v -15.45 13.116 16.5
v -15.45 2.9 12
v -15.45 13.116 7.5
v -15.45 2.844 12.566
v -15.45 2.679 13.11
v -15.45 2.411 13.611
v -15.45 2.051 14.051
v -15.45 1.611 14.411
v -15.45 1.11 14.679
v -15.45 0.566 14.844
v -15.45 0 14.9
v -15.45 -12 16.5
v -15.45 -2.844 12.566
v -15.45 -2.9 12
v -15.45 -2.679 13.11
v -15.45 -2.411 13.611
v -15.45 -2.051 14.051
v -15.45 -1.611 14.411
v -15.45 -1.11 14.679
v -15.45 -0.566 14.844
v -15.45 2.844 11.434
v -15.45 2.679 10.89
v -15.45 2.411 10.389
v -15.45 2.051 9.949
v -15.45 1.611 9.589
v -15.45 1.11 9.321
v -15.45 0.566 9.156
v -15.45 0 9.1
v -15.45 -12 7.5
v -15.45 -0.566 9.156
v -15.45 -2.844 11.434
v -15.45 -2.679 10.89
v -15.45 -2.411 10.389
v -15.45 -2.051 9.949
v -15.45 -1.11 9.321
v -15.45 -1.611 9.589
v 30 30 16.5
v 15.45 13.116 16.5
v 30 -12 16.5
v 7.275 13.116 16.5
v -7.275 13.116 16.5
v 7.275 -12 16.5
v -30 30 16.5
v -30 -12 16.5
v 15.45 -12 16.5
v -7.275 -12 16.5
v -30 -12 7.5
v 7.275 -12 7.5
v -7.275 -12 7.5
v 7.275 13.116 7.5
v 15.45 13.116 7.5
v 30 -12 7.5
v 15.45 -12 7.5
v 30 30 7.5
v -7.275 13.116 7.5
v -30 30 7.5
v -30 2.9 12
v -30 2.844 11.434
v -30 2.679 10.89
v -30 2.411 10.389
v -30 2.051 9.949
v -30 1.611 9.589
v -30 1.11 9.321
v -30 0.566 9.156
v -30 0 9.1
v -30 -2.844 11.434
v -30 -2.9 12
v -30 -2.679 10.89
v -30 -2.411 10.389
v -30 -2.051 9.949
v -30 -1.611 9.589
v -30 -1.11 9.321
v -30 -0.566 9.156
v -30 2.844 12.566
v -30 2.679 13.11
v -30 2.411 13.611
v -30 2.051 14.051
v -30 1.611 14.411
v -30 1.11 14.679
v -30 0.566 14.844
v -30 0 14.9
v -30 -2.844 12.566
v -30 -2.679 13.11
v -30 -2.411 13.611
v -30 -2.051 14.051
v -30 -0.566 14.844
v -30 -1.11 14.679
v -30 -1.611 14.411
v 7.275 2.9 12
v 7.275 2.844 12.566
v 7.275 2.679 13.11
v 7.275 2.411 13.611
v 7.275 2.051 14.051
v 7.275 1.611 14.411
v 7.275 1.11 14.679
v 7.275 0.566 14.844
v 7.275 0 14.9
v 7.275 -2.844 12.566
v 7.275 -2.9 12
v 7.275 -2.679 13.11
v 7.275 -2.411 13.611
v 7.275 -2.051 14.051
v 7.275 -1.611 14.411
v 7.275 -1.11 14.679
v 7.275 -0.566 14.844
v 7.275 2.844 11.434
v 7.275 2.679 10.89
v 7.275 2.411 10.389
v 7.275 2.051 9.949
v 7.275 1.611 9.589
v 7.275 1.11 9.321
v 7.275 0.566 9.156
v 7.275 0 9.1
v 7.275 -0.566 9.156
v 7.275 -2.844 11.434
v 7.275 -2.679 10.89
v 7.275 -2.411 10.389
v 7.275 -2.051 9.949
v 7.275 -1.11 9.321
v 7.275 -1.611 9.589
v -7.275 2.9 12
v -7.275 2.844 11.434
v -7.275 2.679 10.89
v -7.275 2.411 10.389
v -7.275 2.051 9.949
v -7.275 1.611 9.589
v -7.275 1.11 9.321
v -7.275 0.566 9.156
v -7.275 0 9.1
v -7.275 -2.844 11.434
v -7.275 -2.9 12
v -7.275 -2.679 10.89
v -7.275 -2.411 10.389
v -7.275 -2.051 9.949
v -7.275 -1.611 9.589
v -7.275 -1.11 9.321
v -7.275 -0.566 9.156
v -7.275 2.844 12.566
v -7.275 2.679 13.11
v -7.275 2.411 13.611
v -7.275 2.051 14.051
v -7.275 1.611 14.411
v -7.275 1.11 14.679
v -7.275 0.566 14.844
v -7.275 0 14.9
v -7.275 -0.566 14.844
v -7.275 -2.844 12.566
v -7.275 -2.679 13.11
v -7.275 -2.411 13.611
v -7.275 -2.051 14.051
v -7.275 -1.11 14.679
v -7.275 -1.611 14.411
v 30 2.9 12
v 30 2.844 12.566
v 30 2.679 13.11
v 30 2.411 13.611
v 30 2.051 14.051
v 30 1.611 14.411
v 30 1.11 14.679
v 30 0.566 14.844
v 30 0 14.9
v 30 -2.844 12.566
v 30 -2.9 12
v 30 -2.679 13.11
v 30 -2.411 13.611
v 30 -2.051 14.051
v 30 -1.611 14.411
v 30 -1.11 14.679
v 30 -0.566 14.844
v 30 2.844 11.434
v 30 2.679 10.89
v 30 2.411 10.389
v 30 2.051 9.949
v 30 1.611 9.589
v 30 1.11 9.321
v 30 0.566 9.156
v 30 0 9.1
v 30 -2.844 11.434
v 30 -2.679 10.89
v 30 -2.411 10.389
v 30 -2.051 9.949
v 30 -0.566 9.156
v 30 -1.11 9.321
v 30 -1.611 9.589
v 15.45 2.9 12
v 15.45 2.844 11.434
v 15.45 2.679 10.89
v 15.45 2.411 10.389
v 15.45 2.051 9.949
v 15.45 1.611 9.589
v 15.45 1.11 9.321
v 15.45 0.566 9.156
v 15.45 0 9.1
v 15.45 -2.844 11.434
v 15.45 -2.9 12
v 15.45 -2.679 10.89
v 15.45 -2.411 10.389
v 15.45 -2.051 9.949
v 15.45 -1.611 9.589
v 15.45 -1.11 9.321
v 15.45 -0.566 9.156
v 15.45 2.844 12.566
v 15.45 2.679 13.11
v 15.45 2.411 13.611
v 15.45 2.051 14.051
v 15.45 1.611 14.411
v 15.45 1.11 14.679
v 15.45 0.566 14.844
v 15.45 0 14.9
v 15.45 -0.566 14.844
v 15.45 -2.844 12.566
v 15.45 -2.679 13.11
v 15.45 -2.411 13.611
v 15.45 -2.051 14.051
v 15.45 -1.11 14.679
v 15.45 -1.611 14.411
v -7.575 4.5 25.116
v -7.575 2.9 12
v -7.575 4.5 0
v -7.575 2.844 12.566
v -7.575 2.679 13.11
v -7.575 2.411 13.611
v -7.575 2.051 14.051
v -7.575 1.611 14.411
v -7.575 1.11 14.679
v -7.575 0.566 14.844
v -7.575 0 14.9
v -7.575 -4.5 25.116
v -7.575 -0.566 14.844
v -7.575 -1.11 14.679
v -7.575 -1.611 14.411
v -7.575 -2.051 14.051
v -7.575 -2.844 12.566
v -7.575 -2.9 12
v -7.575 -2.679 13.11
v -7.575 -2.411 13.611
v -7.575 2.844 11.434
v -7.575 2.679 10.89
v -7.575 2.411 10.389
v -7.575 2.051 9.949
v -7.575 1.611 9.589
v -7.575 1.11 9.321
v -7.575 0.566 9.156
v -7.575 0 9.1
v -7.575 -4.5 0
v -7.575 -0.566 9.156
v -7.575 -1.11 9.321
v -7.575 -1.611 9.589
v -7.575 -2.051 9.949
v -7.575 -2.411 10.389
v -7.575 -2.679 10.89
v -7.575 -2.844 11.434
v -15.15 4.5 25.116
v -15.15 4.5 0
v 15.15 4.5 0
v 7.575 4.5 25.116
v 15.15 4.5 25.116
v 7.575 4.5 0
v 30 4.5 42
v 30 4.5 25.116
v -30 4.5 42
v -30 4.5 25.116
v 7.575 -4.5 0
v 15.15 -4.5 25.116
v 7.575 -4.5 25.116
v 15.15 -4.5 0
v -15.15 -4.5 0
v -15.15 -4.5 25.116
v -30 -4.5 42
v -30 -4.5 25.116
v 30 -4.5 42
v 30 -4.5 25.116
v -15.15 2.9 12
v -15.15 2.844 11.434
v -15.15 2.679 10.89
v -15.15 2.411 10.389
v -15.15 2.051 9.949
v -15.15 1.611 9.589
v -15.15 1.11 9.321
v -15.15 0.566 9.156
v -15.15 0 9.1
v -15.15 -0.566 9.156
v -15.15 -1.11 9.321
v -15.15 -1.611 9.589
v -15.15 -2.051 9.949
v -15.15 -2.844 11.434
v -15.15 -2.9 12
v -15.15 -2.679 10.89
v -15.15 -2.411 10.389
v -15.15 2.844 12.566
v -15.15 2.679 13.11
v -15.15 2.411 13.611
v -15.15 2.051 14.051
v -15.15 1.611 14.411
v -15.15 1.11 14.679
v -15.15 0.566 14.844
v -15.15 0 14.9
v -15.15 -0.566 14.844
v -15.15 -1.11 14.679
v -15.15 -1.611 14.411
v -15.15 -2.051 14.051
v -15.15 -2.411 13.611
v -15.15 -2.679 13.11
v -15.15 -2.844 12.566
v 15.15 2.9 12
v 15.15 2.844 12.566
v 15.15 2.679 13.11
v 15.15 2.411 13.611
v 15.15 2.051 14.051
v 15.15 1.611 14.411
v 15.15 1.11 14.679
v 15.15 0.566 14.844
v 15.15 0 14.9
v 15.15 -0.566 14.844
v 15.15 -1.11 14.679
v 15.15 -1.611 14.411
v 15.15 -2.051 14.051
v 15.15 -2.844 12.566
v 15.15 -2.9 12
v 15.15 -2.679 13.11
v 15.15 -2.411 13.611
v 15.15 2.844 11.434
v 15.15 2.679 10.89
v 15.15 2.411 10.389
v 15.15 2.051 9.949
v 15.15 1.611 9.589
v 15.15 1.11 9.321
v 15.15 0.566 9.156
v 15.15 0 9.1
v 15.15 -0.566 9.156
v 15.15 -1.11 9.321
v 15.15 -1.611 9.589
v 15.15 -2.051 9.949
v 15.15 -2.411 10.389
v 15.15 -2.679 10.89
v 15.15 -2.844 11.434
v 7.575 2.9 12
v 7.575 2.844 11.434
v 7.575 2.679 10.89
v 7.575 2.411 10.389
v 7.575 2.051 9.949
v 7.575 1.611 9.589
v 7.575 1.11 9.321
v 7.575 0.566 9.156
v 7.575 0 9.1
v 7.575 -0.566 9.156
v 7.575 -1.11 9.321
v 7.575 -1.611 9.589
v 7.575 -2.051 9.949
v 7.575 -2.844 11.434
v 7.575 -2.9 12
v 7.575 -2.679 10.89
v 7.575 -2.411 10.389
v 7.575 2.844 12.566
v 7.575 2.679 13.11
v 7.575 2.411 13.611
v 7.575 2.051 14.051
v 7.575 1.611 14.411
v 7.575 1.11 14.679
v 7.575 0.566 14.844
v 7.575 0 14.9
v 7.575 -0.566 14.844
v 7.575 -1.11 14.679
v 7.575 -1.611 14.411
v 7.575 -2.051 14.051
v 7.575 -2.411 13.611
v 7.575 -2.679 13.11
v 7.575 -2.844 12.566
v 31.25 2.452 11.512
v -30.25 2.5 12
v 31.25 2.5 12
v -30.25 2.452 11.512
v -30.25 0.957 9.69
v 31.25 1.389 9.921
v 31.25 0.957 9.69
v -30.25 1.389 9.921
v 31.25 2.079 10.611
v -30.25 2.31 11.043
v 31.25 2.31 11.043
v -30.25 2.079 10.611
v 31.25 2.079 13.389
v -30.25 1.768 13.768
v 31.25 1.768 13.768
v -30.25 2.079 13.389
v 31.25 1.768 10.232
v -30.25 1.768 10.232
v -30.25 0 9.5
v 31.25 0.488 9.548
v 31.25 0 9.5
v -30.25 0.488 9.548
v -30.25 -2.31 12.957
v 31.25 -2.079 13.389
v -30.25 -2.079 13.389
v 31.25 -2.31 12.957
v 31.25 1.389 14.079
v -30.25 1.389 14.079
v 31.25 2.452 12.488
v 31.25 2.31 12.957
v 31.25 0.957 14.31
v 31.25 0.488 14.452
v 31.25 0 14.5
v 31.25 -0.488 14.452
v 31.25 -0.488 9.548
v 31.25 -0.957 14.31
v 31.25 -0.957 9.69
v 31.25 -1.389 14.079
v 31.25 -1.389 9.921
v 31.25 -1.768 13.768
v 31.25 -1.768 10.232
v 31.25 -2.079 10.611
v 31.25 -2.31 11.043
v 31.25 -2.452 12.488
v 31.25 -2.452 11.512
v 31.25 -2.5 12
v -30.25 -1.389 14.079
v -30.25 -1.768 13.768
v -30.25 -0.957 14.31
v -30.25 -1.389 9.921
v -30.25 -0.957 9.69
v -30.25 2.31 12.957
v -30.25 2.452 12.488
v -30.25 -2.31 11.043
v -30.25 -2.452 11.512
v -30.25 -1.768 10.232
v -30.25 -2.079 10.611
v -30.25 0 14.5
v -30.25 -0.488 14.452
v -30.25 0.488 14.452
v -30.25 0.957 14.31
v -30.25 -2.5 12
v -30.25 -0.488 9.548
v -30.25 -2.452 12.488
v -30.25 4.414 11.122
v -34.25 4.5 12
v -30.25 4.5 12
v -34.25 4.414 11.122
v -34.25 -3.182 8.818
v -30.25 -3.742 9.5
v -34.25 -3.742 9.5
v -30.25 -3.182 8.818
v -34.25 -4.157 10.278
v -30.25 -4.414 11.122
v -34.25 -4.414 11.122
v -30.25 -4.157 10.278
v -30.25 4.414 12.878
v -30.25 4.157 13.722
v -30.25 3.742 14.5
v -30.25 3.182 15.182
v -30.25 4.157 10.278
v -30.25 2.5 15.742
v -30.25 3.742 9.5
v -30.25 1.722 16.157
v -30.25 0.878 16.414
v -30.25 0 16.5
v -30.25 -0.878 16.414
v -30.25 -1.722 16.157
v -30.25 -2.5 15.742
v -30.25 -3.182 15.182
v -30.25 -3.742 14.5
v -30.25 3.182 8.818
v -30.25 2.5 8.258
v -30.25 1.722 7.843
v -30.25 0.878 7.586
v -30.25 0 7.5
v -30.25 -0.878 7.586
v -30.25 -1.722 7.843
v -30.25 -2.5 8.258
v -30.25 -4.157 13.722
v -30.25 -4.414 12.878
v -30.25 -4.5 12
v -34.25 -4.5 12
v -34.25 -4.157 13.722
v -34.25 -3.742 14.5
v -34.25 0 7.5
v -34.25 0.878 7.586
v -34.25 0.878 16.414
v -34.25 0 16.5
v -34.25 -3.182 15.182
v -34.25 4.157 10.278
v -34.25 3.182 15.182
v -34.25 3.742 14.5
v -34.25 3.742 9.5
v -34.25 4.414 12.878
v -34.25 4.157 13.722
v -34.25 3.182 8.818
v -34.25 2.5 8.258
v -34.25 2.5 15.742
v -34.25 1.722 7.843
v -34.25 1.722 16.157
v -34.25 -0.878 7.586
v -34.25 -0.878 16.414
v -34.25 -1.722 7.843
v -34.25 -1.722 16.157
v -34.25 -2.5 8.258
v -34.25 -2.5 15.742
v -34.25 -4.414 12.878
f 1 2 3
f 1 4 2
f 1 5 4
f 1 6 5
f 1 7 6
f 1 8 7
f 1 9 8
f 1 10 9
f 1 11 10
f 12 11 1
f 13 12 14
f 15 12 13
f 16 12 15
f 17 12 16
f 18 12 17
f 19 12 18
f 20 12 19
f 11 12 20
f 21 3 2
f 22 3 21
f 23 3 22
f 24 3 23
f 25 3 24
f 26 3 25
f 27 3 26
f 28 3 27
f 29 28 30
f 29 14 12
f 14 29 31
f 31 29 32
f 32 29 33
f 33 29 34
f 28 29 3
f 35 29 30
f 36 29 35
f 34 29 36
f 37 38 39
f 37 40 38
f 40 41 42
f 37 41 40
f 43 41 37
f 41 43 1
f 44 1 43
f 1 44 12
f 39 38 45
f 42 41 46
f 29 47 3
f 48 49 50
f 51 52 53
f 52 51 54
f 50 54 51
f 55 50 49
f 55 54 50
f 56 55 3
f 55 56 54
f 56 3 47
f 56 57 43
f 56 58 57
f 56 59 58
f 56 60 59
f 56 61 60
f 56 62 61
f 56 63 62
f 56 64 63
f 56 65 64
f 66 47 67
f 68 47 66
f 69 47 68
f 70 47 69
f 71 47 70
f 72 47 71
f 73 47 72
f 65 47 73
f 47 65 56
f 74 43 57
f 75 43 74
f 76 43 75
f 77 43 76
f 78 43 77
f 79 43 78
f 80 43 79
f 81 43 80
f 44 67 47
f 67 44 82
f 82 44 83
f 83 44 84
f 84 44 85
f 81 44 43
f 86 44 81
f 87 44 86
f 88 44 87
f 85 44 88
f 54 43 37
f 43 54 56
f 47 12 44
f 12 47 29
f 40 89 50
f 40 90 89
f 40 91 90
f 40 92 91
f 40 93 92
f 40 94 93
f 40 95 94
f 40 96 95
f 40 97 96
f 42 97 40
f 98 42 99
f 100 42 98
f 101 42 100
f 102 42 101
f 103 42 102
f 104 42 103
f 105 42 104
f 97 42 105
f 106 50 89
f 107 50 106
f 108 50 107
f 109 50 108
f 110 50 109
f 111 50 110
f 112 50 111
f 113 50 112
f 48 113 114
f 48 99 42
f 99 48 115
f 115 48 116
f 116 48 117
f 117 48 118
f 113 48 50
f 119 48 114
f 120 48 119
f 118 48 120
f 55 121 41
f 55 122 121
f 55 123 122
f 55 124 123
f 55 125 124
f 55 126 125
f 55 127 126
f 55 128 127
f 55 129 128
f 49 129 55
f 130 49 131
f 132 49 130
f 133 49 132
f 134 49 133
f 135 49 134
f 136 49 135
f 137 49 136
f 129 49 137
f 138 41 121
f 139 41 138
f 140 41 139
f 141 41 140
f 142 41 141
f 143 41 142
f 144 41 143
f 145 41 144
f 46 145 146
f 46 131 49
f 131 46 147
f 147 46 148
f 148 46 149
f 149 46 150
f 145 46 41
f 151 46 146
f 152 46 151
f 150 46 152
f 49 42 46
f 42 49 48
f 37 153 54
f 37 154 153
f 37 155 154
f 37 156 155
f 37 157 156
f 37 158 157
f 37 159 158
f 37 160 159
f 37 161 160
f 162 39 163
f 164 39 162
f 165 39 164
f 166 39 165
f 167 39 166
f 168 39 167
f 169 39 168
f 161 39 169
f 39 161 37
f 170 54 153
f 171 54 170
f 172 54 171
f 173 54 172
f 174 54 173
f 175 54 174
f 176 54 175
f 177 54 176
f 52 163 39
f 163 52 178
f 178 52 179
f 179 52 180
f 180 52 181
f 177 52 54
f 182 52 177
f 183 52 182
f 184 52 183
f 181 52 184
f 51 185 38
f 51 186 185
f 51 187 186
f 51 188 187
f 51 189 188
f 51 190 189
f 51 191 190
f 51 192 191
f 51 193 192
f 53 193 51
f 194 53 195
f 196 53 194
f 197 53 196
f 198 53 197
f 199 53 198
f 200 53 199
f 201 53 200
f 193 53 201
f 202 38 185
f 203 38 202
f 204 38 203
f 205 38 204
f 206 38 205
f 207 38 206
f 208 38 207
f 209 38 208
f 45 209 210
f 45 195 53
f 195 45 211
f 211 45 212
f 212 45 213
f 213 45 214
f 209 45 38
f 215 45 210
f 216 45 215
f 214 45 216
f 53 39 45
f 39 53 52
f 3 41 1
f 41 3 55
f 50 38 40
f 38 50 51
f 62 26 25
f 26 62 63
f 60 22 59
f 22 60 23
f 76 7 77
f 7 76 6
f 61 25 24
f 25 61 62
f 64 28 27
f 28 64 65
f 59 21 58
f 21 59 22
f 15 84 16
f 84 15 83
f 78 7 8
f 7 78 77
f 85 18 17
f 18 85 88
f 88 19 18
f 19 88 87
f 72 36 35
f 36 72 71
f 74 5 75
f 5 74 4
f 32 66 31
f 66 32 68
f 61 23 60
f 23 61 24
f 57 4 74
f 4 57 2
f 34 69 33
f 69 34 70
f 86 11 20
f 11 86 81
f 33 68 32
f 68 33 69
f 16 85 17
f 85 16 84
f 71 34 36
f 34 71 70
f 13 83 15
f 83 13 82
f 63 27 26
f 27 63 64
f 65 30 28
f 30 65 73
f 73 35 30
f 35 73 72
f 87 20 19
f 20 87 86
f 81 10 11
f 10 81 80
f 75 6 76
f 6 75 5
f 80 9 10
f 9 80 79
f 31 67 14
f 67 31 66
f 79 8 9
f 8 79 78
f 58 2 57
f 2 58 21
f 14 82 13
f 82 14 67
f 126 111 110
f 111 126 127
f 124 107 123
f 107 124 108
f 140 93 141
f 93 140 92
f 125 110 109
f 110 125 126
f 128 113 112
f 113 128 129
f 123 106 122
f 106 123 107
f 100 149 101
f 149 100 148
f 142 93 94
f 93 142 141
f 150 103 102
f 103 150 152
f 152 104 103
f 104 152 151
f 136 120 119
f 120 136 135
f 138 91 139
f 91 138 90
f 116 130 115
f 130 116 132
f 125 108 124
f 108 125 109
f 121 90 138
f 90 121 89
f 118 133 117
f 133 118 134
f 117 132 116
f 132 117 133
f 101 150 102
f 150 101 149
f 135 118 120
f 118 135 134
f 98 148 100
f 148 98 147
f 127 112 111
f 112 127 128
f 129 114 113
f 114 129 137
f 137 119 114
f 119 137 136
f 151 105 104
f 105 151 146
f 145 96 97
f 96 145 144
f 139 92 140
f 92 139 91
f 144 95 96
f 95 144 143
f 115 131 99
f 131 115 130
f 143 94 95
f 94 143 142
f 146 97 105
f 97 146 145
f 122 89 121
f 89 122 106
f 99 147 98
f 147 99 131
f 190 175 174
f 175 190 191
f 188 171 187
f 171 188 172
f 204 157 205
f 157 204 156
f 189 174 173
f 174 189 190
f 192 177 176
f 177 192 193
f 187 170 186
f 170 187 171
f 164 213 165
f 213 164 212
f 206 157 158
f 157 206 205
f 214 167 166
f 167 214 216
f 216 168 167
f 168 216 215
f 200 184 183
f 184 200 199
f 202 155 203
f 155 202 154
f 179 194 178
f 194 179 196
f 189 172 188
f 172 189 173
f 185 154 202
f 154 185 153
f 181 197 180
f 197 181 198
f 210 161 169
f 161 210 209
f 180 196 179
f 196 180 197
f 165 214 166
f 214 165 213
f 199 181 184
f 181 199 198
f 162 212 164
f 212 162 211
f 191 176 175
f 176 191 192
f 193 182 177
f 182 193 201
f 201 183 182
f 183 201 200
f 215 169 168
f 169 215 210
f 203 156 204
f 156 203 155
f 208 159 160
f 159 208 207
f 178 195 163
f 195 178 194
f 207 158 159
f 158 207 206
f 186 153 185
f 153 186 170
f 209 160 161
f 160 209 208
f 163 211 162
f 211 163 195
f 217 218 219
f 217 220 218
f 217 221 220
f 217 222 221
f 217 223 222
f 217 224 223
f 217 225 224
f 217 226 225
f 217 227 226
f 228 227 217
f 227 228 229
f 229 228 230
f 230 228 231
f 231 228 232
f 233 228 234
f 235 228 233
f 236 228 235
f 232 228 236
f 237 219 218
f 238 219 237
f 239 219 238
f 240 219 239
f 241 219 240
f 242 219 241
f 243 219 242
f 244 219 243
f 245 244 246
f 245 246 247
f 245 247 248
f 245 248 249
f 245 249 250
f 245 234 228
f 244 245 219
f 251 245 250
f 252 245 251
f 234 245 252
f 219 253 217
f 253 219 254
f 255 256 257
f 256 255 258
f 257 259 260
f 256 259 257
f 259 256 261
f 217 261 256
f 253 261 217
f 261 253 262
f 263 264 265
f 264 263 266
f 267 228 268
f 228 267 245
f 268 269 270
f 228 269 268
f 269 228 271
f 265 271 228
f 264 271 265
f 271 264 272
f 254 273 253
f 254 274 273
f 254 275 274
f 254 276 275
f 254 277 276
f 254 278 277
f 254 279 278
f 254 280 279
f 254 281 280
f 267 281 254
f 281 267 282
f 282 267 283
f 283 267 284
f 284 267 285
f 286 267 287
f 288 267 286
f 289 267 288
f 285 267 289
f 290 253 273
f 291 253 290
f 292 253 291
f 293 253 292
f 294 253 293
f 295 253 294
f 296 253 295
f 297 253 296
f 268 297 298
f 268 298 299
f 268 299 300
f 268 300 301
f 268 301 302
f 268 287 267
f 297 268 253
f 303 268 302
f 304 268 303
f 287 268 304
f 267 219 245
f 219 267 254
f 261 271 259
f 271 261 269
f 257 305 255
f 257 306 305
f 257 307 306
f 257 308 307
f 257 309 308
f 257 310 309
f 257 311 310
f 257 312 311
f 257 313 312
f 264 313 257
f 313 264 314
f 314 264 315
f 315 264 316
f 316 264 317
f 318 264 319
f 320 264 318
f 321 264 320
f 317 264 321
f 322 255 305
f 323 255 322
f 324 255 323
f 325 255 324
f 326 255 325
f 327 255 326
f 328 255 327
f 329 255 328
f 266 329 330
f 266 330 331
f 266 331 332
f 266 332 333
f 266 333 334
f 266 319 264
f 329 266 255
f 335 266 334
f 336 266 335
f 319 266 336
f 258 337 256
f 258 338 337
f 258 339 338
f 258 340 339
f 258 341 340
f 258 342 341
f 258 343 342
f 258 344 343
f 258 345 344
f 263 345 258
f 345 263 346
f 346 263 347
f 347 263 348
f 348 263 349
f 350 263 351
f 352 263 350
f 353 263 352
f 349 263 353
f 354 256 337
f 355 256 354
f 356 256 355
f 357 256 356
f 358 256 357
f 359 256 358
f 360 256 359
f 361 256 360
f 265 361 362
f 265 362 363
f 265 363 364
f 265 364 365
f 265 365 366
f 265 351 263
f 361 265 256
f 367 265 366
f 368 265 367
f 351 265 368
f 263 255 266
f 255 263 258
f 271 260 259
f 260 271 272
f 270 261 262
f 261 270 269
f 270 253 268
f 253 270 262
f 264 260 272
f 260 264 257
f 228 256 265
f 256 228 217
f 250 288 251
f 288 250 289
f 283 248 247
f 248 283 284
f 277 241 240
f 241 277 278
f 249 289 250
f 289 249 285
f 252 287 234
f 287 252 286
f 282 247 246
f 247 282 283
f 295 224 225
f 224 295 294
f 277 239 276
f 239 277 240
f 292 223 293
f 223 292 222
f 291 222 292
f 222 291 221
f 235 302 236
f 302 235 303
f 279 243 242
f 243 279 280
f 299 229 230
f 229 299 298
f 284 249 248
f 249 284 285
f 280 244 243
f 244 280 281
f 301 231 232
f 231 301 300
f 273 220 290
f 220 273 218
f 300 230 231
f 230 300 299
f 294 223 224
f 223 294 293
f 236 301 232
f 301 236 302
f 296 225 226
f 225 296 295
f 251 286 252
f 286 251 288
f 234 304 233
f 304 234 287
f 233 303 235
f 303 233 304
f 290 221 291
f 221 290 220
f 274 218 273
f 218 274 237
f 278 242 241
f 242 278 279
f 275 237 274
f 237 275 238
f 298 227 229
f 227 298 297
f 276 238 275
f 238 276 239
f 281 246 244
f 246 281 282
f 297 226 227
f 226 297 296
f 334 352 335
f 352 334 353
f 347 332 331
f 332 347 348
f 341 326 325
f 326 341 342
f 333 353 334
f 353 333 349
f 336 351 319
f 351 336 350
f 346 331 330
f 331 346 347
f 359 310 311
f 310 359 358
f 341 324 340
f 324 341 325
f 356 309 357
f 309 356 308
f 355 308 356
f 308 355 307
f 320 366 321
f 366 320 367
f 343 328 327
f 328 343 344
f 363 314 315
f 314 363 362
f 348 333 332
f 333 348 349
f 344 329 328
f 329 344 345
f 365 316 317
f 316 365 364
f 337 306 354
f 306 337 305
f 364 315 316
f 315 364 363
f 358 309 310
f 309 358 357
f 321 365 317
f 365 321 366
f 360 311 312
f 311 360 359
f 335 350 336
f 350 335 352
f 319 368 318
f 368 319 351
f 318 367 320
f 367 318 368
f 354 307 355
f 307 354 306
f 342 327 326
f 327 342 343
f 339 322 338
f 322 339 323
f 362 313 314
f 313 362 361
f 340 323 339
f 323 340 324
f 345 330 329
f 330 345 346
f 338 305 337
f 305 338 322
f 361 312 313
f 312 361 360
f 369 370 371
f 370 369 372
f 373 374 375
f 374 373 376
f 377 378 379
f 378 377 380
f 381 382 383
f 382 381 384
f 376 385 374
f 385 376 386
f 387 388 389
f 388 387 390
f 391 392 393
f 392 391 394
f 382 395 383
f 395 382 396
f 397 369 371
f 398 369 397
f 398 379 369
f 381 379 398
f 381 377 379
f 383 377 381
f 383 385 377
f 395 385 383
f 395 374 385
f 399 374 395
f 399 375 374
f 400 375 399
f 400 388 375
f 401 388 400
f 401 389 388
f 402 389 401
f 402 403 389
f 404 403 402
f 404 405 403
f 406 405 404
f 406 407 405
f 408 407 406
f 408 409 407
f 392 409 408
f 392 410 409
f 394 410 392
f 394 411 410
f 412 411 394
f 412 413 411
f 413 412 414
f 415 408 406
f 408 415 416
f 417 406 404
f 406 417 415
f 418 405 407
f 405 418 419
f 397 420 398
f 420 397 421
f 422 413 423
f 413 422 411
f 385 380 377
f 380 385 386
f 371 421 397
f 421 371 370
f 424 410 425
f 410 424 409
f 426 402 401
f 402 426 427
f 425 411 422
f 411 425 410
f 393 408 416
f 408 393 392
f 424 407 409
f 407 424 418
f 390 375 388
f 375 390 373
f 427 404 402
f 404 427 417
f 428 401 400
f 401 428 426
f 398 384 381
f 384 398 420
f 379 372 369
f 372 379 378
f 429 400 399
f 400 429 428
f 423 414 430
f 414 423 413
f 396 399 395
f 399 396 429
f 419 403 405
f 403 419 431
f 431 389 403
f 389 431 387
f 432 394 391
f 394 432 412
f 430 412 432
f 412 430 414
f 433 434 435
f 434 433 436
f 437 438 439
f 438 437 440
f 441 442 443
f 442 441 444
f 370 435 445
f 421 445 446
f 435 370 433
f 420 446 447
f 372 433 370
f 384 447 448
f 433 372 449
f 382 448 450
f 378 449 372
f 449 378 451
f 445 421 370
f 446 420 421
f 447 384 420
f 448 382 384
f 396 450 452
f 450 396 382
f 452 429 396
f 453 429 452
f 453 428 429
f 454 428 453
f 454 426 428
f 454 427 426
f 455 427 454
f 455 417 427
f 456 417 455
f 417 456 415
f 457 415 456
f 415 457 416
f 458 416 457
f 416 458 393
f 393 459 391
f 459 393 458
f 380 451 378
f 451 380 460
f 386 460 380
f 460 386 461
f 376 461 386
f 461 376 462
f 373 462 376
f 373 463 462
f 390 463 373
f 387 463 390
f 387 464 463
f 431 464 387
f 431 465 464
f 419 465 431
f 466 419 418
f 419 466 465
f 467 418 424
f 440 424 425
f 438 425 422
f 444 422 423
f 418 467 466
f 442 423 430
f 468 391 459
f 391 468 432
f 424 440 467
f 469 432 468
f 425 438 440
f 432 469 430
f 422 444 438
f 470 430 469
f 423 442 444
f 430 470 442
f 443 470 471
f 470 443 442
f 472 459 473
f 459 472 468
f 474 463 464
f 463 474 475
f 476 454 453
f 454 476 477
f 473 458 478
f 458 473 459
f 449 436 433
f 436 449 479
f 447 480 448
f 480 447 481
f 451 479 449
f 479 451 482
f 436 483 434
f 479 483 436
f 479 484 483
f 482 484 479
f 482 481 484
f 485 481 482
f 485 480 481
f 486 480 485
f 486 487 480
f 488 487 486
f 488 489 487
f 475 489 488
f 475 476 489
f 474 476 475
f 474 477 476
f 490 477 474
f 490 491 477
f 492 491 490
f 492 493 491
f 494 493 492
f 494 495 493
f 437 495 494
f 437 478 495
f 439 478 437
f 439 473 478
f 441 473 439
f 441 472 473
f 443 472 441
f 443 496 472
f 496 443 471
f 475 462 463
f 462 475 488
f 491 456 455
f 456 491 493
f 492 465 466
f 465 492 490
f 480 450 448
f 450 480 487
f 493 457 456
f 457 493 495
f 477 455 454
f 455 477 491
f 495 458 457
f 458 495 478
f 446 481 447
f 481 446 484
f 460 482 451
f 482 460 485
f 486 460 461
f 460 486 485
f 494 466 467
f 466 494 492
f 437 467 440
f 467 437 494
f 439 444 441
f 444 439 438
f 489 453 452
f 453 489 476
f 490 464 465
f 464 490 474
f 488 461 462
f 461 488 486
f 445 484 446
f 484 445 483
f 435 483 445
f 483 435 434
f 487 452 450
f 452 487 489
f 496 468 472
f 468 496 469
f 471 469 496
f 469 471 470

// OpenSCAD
$fn = 32;

// ------------------------------------------------------------------------
// Butt hinge: hinge 60 mm, leaf swung 270 deg
// Every part is its own module, assembly() places every instance.
// ------------------------------------------------------------------------

// --- part 1 ---
module hinge_base() {
  difference() {
    union() {
      translate([-30, -12, -4.5]) cube([14.55, 42, 9]);
      translate([-7.275, -12, -4.5]) cube([14.55, 42, 9]);
      translate([15.45, -12, -4.5]) cube([14.55, 42, 9]);
      translate([-30, 13.116, -4.5]) cube([60, 16.884, 9]);
    }
    translate([-22.725, 0, 0]) rotate([0, 90, 0]) cylinder(h = 16.55, d = 5.8, center = true);
    translate([0, 0, 0]) rotate([0, 90, 0]) cylinder(h = 16.55, d = 5.8, center = true);
    translate([22.725, 0, 0]) rotate([0, 90, 0]) cylinder(h = 16.55, d = 5.8, center = true);
  }
}

// --- part 2 ---
module hinge_mover() {
  difference() {
    union() {
      translate([-15.15, -30, -4.5]) cube([7.575, 42, 9]);
      translate([7.575, -30, -4.5]) cube([7.575, 42, 9]);
      translate([-30, -30, -4.5]) cube([60, 16.884, 9]);
    }
    translate([-11.362, 0, 0]) rotate([0, 90, 0]) cylinder(h = 9.575, d = 5.8, center = true);
    translate([11.362, 0, 0]) rotate([0, 90, 0]) cylinder(h = 9.575, d = 5.8, center = true);
  }
}

// --- part 3 ---
module hinge_pin() {
  rotate([0, 90, 0]) cylinder(h = 62.5, d = 5, center = true);
  translate([-34.25, 0, 0]) rotate([0, 90, 0]) cylinder(h = 4, d = 9);
}

// --- assembly ---
module assembly() {
  color([0.80, 0.24, 0.20]) translate([0, 0, 12]) rotate([0, 0, 0]) hinge_base();
  color([0.20, 0.45, 0.75]) translate([0, 0, 12]) rotate([270, 0, 0]) hinge_mover();
  color([0.25, 0.62, 0.32]) translate([0, 0, 12]) rotate([0, 0, 0]) hinge_pin();
}

assembly();
